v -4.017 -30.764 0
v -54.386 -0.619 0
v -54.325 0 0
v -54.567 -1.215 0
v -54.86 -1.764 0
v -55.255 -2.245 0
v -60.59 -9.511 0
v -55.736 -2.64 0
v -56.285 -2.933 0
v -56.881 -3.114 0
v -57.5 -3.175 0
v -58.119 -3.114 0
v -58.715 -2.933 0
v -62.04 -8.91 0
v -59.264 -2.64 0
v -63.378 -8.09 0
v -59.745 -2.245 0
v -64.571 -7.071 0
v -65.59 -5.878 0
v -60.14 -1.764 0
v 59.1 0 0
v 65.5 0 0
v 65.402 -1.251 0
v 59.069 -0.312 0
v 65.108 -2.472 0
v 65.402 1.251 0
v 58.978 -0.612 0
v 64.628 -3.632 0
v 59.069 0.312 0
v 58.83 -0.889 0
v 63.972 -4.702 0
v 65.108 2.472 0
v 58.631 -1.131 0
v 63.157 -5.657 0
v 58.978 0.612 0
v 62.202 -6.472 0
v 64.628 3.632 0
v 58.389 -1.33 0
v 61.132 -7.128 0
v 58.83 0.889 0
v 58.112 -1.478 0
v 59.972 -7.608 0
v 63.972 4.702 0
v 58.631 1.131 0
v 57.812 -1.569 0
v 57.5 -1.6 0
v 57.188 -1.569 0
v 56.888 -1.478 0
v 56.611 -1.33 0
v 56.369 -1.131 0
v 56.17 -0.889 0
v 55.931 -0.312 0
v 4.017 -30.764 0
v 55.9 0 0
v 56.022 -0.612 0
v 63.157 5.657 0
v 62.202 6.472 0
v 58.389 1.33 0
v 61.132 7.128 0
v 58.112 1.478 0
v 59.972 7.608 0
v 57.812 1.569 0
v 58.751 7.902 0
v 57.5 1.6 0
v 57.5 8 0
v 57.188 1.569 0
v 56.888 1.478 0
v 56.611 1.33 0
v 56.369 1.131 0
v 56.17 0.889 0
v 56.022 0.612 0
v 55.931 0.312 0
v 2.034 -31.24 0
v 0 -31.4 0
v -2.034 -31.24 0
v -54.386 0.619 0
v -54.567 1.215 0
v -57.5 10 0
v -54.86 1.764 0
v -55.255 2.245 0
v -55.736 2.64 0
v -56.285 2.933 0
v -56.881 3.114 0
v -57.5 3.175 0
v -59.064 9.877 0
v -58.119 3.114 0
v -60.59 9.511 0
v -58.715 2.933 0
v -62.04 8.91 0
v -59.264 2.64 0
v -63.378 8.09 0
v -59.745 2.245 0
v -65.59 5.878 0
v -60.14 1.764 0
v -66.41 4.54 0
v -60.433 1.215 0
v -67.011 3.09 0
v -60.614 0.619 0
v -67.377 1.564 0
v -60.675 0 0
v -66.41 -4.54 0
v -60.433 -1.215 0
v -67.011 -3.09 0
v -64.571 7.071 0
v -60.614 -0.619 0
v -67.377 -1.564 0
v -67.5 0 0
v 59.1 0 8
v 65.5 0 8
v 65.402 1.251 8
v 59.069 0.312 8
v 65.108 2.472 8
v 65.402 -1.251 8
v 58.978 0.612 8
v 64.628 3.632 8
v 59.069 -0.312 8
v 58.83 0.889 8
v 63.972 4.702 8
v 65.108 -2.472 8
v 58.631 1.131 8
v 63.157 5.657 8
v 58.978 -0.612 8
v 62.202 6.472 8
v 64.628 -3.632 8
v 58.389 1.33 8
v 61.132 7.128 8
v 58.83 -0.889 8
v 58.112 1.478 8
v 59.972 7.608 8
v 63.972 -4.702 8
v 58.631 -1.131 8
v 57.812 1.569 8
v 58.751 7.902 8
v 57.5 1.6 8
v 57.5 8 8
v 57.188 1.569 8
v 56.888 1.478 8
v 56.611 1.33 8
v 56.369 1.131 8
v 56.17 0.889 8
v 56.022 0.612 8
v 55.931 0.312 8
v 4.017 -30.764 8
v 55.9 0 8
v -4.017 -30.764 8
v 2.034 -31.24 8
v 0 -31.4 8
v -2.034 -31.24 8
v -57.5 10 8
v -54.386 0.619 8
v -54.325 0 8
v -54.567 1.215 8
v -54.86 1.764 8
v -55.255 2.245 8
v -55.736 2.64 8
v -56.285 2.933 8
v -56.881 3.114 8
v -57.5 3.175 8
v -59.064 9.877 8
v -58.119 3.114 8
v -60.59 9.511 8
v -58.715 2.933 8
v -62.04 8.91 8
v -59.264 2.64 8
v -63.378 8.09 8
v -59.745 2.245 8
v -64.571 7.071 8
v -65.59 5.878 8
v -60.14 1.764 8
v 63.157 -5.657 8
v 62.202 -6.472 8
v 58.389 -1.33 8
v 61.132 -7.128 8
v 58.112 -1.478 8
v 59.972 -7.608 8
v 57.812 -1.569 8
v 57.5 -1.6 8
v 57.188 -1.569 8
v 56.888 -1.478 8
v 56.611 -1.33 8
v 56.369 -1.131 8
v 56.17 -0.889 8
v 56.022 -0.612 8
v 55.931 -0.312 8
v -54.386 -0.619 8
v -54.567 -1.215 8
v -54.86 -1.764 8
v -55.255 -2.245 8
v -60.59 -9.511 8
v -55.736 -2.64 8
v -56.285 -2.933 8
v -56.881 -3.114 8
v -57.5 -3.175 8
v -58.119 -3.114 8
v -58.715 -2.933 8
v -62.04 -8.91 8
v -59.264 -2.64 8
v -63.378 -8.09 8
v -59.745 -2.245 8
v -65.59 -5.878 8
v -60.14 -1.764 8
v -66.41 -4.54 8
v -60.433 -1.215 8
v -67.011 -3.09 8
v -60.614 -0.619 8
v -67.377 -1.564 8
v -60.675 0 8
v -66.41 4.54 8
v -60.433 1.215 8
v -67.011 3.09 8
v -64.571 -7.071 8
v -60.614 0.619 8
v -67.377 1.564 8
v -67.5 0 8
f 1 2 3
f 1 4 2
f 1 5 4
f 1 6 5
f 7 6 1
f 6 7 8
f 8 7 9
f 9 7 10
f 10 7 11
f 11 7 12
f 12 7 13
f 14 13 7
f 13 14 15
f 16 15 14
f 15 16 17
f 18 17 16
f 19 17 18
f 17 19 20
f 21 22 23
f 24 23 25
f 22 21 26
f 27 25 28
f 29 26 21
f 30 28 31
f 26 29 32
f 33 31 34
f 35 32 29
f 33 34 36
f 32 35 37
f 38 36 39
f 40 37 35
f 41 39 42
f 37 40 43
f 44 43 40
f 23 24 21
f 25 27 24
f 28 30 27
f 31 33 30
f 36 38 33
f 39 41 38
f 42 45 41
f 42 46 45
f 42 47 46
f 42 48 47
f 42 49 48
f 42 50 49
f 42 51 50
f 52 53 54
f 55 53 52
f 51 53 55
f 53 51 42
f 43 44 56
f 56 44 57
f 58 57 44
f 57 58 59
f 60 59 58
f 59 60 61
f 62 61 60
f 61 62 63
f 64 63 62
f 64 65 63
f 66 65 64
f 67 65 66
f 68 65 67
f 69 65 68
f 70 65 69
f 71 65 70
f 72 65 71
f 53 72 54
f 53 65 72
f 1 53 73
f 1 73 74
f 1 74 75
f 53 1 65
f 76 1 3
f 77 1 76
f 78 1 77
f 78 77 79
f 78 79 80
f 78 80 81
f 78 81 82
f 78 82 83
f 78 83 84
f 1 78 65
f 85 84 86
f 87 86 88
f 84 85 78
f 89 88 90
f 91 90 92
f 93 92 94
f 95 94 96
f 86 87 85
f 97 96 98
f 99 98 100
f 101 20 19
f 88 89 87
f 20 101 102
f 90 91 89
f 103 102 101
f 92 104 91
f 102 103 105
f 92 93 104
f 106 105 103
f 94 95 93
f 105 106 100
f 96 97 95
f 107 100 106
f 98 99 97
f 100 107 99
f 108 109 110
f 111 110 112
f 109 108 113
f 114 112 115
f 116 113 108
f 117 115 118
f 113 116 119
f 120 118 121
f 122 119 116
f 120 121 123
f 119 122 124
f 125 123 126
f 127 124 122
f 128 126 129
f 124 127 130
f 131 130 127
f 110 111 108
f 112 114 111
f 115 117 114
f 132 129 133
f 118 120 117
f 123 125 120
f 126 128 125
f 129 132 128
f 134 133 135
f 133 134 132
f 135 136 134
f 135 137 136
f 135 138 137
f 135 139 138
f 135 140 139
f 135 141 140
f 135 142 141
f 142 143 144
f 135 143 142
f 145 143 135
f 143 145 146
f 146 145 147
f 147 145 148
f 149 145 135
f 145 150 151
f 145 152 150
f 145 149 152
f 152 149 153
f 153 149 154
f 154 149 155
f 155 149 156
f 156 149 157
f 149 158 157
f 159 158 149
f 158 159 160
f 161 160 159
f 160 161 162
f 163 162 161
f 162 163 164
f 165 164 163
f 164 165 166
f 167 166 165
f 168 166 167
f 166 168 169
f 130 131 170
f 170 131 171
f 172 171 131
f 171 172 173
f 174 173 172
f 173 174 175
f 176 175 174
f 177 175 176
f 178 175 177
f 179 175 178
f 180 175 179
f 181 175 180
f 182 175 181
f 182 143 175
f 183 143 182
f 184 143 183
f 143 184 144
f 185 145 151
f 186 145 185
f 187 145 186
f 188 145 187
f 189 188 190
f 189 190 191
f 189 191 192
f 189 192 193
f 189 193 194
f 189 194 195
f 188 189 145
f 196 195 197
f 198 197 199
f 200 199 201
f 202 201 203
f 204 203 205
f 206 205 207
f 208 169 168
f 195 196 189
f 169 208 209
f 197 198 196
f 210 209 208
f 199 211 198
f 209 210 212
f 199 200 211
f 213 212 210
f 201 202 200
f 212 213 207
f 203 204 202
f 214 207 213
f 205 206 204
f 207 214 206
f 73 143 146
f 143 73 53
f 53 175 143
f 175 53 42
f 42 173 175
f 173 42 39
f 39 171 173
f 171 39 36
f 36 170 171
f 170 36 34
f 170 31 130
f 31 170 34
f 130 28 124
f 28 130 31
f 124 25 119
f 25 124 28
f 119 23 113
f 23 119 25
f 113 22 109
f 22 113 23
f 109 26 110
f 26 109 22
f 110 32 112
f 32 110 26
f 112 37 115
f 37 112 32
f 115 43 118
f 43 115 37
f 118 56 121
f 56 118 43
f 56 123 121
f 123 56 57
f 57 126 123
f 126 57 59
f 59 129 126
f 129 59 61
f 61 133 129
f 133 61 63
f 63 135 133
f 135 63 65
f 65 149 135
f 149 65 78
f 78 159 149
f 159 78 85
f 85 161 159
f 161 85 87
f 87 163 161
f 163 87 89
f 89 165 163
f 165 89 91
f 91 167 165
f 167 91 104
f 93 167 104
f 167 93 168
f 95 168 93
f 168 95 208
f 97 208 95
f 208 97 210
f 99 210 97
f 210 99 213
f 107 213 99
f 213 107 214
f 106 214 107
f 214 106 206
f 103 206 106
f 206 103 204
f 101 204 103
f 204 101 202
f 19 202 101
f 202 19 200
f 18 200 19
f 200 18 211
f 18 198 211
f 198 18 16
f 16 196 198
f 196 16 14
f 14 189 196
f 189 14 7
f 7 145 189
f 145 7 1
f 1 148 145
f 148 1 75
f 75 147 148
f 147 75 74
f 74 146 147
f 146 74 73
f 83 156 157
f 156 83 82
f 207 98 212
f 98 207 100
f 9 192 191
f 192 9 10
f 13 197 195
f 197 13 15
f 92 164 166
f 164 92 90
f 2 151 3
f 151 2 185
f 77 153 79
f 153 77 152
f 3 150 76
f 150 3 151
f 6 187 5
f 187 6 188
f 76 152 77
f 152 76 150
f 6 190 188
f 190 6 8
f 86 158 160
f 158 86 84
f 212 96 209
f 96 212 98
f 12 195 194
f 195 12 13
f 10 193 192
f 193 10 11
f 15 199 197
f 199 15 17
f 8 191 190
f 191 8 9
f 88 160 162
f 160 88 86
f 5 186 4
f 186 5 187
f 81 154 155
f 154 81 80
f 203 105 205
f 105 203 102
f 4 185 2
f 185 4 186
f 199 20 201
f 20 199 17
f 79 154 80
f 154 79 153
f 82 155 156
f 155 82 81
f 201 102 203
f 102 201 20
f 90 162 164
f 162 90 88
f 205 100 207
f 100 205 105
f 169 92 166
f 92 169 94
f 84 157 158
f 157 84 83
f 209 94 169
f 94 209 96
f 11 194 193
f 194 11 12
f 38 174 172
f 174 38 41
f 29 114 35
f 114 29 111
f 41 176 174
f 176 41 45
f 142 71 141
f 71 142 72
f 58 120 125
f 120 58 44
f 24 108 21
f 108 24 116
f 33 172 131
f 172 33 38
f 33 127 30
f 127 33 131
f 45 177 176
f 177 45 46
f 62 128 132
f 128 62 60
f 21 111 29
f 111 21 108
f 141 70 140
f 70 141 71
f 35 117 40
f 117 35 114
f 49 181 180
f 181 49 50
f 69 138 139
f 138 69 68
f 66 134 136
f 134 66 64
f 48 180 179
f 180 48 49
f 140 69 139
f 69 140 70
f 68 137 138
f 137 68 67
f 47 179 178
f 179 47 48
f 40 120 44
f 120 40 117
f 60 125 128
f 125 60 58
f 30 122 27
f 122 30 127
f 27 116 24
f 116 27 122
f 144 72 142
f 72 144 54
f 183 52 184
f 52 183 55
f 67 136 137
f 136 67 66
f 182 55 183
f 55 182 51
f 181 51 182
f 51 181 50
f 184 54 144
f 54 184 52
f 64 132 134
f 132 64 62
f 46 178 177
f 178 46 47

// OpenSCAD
$fn = 32;

// ----------------------------------------------------------------------
// Lever: 115 mm between the bosses, 8 mm thick, smooth outline
// ----------------------------------------------------------------------

// --- parameters (mm) ---
lever_l = 115;            // distance between the boss centres
boss_a = 20;              // first boss diameter
boss_b = 16;              // second boss diameter
bore_a = 6.35;            // first bore
bore_b = 3.2;             // second bore
lever_t = 8;              // lever thickness
boss_c = 26;              // middle boss diameter
bend = 18.4;              // how far the middle boss drops

lever_profile = [[-67.5, 0], [-67.377, -1.564], [-67.011, -3.09], [-66.41, -4.54], [-65.59, -5.878], [-64.571, -7.071], [-63.378, -8.09], [-62.04, -8.91], [-60.59, -9.511], [-4.017, -30.764], [-2.034, -31.24], [0, -31.4], [2.034, -31.24], [4.017, -30.764], [59.972, -7.608], [61.132, -7.128], [62.202, -6.472], [63.157, -5.657], [63.972, -4.702], [64.628, -3.632], [65.108, -2.472], [65.402, -1.251], [65.5, 0], [65.402, 1.251], [65.108, 2.472], [64.628, 3.632], [63.972, 4.702], [63.157, 5.657], [62.202, 6.472], [61.132, 7.128], [59.972, 7.608], [58.751, 7.902], [57.5, 8], [-57.5, 10], [-59.064, 9.877], [-60.59, 9.511], [-62.04, 8.91], [-63.378, 8.09], [-64.571, 7.071], [-65.59, 5.878], [-66.41, 4.54], [-67.011, 3.09], [-67.377, 1.564]];

difference() {
  linear_extrude(height = lever_t) polygon(lever_profile);
  translate([-57.5, 0, -2.5]) cylinder(h = lever_t + 5, d = bore_a);
  translate([57.5, 0, -2.5]) cylinder(h = lever_t + 5, d = bore_b);
}
